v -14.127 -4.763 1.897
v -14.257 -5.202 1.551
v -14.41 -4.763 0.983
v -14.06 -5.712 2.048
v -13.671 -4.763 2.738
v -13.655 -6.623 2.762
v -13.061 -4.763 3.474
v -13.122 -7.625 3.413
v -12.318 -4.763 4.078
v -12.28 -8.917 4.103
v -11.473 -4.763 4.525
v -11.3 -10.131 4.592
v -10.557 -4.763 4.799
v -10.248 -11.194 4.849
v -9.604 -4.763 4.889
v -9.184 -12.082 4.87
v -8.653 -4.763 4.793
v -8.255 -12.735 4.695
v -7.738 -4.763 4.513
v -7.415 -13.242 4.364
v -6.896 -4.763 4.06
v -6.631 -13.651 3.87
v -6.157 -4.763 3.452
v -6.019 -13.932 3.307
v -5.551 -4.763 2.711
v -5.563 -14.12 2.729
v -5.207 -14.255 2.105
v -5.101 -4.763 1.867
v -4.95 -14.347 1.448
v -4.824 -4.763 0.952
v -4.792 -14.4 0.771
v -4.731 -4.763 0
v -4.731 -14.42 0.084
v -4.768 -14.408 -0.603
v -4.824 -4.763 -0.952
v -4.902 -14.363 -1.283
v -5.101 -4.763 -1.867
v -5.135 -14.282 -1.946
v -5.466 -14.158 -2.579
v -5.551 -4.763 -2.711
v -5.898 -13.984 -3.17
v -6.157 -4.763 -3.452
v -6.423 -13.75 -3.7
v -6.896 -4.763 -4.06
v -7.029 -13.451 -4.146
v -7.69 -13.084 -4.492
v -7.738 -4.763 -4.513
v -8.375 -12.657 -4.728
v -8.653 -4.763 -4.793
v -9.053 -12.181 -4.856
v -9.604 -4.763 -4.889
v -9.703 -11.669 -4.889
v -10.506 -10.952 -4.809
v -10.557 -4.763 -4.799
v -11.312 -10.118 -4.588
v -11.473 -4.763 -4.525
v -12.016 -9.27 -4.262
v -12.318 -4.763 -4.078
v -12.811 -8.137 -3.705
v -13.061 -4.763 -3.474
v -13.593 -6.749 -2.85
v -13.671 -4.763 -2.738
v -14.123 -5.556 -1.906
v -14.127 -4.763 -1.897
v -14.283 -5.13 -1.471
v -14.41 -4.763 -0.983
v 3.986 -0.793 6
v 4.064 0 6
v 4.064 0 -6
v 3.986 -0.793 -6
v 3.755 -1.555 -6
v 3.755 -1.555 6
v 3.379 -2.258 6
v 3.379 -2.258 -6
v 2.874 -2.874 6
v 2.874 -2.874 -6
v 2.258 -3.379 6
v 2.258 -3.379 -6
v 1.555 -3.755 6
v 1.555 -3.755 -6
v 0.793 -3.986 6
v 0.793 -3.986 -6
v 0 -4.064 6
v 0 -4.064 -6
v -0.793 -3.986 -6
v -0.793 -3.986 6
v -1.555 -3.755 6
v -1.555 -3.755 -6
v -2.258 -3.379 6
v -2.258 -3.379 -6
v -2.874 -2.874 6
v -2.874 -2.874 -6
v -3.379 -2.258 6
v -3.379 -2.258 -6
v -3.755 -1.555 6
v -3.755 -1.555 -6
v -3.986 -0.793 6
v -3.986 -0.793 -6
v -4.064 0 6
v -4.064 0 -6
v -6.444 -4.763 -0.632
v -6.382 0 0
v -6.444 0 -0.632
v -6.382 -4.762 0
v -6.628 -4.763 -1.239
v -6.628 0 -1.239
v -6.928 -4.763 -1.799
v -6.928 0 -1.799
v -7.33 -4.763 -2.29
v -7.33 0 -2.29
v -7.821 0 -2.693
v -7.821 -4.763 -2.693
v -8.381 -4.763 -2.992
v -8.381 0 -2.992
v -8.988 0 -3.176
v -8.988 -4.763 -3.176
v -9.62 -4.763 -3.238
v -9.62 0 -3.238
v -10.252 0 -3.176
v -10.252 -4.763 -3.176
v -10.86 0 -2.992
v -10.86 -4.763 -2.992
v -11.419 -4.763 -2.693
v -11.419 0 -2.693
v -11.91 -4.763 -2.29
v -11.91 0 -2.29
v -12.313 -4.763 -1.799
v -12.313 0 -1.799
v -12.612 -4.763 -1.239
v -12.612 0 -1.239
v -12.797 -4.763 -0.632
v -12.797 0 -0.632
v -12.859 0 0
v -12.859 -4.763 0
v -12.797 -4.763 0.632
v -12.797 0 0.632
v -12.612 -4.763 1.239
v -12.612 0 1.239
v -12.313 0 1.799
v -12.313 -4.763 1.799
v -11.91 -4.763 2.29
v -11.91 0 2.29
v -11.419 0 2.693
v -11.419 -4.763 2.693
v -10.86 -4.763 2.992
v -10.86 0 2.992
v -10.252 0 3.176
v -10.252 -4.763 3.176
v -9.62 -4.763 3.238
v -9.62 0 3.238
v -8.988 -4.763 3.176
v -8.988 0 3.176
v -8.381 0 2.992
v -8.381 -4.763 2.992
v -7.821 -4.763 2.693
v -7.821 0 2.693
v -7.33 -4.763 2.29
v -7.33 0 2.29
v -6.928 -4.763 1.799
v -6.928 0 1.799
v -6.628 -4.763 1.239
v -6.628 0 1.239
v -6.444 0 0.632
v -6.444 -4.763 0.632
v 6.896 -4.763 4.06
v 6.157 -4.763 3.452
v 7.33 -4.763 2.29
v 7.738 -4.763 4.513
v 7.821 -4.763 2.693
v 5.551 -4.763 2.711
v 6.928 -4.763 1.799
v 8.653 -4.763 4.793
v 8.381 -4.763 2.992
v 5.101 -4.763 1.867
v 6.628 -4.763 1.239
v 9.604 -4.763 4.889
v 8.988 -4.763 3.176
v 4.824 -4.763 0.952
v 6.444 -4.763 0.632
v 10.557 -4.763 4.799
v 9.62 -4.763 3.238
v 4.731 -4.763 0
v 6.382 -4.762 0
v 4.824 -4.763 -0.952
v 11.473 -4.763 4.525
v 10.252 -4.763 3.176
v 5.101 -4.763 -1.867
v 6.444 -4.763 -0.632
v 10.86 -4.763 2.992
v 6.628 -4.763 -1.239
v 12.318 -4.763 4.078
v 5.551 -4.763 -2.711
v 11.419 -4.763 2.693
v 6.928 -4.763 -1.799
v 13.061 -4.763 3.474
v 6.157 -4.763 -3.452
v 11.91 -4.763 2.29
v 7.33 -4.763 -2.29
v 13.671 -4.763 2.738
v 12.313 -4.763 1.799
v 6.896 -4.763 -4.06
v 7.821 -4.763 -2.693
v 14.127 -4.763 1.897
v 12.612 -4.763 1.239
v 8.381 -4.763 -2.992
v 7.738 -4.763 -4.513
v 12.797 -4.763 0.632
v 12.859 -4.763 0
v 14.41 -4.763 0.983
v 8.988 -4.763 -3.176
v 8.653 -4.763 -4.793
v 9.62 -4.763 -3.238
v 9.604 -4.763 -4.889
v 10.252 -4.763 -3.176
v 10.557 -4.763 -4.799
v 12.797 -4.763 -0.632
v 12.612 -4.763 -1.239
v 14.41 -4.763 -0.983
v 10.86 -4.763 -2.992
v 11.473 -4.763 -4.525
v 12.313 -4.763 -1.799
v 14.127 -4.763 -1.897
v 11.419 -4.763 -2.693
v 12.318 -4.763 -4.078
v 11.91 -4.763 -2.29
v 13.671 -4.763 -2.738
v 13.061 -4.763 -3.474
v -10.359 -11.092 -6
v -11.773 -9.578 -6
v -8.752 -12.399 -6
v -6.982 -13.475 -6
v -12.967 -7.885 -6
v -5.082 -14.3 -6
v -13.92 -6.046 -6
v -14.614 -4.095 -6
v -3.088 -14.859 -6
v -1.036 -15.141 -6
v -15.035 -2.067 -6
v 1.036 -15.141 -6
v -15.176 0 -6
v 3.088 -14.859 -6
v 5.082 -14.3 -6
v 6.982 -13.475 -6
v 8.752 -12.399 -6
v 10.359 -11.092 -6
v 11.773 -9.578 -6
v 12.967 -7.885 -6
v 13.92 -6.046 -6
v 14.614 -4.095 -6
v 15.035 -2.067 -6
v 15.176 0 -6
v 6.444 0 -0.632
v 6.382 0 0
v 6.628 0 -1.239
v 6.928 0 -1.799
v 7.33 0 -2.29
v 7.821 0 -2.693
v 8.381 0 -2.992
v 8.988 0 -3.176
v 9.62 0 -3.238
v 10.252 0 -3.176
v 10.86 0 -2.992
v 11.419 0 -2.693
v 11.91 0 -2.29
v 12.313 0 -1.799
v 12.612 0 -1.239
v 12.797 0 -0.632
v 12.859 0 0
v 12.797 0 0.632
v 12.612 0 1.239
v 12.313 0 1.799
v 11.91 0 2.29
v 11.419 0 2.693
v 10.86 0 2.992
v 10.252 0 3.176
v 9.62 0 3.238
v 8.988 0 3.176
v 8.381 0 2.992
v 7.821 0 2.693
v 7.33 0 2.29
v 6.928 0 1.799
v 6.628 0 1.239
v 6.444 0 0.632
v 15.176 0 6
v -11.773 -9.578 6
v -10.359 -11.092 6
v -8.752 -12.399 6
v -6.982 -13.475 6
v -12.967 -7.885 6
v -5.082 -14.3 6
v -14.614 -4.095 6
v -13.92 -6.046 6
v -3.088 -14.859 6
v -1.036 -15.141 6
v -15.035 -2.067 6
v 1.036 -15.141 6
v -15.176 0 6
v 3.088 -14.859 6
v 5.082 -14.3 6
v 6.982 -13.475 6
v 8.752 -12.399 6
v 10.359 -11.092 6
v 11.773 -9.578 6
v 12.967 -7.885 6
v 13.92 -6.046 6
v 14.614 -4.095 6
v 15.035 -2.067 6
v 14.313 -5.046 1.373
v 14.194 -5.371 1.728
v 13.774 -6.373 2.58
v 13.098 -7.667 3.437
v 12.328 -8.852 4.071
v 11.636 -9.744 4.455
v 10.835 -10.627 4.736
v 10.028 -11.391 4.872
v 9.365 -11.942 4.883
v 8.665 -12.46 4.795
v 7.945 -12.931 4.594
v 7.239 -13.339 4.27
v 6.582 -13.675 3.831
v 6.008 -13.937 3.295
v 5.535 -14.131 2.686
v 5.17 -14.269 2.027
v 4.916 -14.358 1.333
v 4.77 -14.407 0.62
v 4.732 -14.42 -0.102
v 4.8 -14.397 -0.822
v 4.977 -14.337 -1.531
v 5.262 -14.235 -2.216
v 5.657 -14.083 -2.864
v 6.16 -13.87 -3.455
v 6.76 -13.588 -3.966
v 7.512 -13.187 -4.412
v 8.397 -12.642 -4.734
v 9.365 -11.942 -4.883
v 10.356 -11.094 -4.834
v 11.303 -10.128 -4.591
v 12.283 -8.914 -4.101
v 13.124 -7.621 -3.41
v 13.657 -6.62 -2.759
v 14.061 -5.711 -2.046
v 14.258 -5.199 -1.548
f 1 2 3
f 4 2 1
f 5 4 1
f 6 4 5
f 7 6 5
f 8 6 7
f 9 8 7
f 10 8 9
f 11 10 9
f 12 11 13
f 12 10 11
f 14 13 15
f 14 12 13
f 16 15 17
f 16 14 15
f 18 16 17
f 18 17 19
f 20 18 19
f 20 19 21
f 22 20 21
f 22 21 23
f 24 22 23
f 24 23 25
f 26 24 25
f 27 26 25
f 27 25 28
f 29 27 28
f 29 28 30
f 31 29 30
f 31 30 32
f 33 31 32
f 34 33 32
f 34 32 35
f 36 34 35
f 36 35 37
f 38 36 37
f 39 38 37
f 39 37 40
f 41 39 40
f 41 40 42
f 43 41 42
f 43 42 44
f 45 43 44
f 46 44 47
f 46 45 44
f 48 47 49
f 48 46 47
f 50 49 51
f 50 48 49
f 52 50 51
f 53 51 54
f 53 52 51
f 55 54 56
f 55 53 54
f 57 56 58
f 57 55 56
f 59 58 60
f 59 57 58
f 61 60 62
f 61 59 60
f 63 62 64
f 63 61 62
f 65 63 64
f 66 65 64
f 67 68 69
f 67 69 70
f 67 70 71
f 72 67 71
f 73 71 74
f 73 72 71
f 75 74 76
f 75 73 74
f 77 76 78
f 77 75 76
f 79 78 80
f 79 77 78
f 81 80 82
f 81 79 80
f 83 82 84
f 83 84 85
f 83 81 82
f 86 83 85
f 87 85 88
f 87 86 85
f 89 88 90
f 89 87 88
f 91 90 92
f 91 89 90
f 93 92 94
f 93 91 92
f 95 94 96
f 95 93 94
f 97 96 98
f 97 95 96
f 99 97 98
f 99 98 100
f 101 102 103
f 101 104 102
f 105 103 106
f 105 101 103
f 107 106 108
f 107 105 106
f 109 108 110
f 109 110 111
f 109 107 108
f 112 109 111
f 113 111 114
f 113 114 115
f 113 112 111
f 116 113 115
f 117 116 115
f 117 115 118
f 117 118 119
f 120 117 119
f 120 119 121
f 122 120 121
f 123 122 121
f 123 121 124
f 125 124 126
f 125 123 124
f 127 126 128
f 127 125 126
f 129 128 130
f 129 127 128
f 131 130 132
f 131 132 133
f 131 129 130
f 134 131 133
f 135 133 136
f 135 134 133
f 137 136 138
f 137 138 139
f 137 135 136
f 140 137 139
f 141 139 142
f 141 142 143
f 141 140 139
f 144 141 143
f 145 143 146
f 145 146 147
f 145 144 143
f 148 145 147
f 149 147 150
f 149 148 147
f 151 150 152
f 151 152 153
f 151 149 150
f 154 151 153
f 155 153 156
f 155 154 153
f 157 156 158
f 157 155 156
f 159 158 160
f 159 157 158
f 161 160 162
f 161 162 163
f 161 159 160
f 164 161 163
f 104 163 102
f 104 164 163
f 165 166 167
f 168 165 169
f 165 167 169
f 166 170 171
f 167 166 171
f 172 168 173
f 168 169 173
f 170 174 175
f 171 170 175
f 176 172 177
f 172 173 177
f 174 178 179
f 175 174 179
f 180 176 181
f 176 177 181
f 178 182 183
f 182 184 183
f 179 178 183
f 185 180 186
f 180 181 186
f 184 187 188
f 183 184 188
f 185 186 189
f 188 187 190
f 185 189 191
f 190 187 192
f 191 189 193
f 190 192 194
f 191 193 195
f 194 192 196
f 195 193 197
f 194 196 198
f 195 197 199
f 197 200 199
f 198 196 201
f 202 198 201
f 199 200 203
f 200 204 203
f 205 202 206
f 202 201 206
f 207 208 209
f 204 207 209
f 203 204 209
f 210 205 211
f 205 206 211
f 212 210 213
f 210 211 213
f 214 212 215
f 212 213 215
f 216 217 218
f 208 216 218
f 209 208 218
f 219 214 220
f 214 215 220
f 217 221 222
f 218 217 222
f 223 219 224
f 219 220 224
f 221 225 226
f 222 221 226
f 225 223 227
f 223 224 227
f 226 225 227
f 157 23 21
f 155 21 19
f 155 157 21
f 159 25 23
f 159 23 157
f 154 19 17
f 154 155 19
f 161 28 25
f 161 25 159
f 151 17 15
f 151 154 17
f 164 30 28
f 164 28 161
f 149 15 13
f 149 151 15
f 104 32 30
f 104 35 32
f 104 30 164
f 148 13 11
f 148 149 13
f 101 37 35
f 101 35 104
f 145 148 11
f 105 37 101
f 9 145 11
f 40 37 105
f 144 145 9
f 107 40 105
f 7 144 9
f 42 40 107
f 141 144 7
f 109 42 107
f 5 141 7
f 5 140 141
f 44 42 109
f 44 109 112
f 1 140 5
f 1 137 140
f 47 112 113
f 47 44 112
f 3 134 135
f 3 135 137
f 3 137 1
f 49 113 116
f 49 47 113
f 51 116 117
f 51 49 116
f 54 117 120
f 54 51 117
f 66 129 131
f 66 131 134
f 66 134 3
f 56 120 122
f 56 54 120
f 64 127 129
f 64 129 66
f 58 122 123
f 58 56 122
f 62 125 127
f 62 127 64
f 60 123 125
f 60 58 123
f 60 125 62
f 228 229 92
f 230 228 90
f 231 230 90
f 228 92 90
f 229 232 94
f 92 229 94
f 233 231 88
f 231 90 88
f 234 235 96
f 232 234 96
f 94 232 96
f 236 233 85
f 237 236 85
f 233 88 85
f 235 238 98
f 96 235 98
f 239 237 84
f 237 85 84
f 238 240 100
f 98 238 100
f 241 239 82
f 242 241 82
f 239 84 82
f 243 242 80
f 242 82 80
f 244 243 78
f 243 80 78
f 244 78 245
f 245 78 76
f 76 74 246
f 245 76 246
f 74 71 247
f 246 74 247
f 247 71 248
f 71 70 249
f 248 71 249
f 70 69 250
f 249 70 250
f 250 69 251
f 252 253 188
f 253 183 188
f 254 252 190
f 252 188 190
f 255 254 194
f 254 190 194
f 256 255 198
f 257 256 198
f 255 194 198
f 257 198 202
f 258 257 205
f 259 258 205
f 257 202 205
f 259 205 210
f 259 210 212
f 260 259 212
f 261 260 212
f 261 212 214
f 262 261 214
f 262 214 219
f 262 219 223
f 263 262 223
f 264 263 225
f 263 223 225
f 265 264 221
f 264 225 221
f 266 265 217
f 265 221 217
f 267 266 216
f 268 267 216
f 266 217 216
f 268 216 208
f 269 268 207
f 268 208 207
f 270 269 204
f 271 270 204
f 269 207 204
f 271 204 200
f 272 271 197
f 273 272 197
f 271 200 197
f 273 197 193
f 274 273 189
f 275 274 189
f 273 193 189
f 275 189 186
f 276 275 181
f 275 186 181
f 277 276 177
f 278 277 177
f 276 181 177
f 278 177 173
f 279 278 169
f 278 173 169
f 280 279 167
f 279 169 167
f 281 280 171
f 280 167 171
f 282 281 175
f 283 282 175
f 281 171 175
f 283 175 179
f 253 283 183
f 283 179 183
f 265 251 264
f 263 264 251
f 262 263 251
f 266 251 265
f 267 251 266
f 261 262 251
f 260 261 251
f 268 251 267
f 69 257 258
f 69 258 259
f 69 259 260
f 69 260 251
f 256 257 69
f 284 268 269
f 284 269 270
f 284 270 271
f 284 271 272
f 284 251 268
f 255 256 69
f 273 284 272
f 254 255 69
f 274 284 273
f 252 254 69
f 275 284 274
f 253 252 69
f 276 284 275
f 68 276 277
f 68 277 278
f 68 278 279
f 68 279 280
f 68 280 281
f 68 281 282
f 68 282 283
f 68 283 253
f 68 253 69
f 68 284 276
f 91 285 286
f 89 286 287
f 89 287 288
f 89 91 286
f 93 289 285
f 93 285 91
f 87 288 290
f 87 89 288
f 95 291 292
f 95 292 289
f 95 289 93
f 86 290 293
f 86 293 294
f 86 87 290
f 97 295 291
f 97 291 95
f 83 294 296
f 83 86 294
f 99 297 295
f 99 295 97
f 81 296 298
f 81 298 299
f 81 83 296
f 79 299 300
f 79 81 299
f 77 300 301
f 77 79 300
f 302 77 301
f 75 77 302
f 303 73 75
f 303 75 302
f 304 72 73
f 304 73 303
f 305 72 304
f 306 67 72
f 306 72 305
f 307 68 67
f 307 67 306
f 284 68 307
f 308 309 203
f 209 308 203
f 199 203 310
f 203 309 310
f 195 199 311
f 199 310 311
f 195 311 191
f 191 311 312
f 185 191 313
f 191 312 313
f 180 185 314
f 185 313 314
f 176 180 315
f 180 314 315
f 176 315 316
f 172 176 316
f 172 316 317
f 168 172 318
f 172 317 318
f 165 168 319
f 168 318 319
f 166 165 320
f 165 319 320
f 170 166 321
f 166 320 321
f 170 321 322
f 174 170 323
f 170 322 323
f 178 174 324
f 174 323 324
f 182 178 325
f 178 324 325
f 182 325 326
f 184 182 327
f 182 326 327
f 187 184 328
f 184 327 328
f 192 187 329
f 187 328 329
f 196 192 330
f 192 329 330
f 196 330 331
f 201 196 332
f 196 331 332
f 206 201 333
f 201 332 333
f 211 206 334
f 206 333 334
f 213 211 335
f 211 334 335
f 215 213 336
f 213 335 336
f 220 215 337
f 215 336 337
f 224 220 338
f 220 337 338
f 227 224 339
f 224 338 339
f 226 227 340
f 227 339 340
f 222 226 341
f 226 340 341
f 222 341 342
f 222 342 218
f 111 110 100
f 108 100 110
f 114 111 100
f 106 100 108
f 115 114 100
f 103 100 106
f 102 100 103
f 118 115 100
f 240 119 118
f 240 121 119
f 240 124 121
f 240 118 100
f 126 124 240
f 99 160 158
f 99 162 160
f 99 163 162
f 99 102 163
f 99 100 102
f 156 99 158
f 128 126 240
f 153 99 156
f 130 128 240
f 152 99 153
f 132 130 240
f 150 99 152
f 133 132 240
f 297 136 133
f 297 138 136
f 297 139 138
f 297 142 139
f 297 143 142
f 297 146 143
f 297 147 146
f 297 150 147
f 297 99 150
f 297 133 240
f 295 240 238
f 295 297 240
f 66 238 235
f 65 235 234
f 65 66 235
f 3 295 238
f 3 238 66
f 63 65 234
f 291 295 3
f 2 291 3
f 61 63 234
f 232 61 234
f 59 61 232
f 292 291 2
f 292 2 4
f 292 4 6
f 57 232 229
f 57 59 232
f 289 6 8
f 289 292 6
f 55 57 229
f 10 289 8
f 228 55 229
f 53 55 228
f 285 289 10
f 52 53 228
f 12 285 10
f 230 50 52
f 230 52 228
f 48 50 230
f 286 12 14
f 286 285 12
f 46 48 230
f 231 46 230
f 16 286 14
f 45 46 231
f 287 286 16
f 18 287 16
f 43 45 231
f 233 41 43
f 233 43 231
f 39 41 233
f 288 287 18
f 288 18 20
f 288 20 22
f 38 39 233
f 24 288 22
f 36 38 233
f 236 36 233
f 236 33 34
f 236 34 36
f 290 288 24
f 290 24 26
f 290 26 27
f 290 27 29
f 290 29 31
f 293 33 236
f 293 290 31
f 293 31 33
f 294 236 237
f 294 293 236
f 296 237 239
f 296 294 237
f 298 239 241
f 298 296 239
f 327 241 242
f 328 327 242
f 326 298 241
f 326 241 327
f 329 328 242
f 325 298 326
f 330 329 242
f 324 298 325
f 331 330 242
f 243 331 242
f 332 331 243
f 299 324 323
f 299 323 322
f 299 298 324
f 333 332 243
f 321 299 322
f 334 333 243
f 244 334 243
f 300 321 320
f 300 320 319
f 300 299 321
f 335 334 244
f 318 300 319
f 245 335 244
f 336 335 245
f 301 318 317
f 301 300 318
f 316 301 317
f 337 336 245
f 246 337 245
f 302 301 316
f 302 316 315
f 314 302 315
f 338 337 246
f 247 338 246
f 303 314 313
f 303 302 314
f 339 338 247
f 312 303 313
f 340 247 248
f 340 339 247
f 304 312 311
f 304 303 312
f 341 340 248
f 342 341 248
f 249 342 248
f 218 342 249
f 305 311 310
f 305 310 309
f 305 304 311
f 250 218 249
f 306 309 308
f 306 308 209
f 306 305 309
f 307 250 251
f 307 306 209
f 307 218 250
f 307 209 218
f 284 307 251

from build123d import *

# Parameters (mm, degrees)
BOSS_EXTRUDE1_DEPTH      = 6
BOSS_EXTRUDE1_DEPTH_BACK = 6


with BuildPart() as part:
    # Sketch1 → Boss-Extrude1 (new body, two sides)
    with BuildSketch(Plane.XY) as boss_extrude1_sk:
        with BuildLine():
            Line((15.1765, 0), (4.064, 0))
            ThreePointArc((4.064, 0), (0, -4.064), (-4.064, 0))
            Line((-4.064, 0), (-15.1765, 0))
            ThreePointArc((-15.1765, 0), (0, -15.1765), (15.1765, 0))
        make_face()
    extrude(amount=BOSS_EXTRUDE1_DEPTH)
    extrude(boss_extrude1_sk.sketch, amount=-BOSS_EXTRUDE1_DEPTH_BACK)

    # Sketch2 → Cut-Revolve1 (revolve, cut)
    with BuildSketch(Plane.XY):
        Polygon((-9.62025, 0), (-6.38175, 0), (-6.38175, -4.7625), (-4.73075, -4.7625), (-4.73075, -14.4203383), (-9.62025, -14.4203383), align=None)
    cut_revolve1 = revolve(axis=Axis((-9.62025, -14.4203383, 0), (0, 1, 0)), mode=Mode.SUBTRACT)

    # Mirror1: Cut-Revolve1 across plane
    add(cut_revolve1.mirror(Plane(origin=(0, 0, 0), x_dir=(0, 0, 1), z_dir=(1, 0, 0))), mode=Mode.SUBTRACT)


solid = part.part
